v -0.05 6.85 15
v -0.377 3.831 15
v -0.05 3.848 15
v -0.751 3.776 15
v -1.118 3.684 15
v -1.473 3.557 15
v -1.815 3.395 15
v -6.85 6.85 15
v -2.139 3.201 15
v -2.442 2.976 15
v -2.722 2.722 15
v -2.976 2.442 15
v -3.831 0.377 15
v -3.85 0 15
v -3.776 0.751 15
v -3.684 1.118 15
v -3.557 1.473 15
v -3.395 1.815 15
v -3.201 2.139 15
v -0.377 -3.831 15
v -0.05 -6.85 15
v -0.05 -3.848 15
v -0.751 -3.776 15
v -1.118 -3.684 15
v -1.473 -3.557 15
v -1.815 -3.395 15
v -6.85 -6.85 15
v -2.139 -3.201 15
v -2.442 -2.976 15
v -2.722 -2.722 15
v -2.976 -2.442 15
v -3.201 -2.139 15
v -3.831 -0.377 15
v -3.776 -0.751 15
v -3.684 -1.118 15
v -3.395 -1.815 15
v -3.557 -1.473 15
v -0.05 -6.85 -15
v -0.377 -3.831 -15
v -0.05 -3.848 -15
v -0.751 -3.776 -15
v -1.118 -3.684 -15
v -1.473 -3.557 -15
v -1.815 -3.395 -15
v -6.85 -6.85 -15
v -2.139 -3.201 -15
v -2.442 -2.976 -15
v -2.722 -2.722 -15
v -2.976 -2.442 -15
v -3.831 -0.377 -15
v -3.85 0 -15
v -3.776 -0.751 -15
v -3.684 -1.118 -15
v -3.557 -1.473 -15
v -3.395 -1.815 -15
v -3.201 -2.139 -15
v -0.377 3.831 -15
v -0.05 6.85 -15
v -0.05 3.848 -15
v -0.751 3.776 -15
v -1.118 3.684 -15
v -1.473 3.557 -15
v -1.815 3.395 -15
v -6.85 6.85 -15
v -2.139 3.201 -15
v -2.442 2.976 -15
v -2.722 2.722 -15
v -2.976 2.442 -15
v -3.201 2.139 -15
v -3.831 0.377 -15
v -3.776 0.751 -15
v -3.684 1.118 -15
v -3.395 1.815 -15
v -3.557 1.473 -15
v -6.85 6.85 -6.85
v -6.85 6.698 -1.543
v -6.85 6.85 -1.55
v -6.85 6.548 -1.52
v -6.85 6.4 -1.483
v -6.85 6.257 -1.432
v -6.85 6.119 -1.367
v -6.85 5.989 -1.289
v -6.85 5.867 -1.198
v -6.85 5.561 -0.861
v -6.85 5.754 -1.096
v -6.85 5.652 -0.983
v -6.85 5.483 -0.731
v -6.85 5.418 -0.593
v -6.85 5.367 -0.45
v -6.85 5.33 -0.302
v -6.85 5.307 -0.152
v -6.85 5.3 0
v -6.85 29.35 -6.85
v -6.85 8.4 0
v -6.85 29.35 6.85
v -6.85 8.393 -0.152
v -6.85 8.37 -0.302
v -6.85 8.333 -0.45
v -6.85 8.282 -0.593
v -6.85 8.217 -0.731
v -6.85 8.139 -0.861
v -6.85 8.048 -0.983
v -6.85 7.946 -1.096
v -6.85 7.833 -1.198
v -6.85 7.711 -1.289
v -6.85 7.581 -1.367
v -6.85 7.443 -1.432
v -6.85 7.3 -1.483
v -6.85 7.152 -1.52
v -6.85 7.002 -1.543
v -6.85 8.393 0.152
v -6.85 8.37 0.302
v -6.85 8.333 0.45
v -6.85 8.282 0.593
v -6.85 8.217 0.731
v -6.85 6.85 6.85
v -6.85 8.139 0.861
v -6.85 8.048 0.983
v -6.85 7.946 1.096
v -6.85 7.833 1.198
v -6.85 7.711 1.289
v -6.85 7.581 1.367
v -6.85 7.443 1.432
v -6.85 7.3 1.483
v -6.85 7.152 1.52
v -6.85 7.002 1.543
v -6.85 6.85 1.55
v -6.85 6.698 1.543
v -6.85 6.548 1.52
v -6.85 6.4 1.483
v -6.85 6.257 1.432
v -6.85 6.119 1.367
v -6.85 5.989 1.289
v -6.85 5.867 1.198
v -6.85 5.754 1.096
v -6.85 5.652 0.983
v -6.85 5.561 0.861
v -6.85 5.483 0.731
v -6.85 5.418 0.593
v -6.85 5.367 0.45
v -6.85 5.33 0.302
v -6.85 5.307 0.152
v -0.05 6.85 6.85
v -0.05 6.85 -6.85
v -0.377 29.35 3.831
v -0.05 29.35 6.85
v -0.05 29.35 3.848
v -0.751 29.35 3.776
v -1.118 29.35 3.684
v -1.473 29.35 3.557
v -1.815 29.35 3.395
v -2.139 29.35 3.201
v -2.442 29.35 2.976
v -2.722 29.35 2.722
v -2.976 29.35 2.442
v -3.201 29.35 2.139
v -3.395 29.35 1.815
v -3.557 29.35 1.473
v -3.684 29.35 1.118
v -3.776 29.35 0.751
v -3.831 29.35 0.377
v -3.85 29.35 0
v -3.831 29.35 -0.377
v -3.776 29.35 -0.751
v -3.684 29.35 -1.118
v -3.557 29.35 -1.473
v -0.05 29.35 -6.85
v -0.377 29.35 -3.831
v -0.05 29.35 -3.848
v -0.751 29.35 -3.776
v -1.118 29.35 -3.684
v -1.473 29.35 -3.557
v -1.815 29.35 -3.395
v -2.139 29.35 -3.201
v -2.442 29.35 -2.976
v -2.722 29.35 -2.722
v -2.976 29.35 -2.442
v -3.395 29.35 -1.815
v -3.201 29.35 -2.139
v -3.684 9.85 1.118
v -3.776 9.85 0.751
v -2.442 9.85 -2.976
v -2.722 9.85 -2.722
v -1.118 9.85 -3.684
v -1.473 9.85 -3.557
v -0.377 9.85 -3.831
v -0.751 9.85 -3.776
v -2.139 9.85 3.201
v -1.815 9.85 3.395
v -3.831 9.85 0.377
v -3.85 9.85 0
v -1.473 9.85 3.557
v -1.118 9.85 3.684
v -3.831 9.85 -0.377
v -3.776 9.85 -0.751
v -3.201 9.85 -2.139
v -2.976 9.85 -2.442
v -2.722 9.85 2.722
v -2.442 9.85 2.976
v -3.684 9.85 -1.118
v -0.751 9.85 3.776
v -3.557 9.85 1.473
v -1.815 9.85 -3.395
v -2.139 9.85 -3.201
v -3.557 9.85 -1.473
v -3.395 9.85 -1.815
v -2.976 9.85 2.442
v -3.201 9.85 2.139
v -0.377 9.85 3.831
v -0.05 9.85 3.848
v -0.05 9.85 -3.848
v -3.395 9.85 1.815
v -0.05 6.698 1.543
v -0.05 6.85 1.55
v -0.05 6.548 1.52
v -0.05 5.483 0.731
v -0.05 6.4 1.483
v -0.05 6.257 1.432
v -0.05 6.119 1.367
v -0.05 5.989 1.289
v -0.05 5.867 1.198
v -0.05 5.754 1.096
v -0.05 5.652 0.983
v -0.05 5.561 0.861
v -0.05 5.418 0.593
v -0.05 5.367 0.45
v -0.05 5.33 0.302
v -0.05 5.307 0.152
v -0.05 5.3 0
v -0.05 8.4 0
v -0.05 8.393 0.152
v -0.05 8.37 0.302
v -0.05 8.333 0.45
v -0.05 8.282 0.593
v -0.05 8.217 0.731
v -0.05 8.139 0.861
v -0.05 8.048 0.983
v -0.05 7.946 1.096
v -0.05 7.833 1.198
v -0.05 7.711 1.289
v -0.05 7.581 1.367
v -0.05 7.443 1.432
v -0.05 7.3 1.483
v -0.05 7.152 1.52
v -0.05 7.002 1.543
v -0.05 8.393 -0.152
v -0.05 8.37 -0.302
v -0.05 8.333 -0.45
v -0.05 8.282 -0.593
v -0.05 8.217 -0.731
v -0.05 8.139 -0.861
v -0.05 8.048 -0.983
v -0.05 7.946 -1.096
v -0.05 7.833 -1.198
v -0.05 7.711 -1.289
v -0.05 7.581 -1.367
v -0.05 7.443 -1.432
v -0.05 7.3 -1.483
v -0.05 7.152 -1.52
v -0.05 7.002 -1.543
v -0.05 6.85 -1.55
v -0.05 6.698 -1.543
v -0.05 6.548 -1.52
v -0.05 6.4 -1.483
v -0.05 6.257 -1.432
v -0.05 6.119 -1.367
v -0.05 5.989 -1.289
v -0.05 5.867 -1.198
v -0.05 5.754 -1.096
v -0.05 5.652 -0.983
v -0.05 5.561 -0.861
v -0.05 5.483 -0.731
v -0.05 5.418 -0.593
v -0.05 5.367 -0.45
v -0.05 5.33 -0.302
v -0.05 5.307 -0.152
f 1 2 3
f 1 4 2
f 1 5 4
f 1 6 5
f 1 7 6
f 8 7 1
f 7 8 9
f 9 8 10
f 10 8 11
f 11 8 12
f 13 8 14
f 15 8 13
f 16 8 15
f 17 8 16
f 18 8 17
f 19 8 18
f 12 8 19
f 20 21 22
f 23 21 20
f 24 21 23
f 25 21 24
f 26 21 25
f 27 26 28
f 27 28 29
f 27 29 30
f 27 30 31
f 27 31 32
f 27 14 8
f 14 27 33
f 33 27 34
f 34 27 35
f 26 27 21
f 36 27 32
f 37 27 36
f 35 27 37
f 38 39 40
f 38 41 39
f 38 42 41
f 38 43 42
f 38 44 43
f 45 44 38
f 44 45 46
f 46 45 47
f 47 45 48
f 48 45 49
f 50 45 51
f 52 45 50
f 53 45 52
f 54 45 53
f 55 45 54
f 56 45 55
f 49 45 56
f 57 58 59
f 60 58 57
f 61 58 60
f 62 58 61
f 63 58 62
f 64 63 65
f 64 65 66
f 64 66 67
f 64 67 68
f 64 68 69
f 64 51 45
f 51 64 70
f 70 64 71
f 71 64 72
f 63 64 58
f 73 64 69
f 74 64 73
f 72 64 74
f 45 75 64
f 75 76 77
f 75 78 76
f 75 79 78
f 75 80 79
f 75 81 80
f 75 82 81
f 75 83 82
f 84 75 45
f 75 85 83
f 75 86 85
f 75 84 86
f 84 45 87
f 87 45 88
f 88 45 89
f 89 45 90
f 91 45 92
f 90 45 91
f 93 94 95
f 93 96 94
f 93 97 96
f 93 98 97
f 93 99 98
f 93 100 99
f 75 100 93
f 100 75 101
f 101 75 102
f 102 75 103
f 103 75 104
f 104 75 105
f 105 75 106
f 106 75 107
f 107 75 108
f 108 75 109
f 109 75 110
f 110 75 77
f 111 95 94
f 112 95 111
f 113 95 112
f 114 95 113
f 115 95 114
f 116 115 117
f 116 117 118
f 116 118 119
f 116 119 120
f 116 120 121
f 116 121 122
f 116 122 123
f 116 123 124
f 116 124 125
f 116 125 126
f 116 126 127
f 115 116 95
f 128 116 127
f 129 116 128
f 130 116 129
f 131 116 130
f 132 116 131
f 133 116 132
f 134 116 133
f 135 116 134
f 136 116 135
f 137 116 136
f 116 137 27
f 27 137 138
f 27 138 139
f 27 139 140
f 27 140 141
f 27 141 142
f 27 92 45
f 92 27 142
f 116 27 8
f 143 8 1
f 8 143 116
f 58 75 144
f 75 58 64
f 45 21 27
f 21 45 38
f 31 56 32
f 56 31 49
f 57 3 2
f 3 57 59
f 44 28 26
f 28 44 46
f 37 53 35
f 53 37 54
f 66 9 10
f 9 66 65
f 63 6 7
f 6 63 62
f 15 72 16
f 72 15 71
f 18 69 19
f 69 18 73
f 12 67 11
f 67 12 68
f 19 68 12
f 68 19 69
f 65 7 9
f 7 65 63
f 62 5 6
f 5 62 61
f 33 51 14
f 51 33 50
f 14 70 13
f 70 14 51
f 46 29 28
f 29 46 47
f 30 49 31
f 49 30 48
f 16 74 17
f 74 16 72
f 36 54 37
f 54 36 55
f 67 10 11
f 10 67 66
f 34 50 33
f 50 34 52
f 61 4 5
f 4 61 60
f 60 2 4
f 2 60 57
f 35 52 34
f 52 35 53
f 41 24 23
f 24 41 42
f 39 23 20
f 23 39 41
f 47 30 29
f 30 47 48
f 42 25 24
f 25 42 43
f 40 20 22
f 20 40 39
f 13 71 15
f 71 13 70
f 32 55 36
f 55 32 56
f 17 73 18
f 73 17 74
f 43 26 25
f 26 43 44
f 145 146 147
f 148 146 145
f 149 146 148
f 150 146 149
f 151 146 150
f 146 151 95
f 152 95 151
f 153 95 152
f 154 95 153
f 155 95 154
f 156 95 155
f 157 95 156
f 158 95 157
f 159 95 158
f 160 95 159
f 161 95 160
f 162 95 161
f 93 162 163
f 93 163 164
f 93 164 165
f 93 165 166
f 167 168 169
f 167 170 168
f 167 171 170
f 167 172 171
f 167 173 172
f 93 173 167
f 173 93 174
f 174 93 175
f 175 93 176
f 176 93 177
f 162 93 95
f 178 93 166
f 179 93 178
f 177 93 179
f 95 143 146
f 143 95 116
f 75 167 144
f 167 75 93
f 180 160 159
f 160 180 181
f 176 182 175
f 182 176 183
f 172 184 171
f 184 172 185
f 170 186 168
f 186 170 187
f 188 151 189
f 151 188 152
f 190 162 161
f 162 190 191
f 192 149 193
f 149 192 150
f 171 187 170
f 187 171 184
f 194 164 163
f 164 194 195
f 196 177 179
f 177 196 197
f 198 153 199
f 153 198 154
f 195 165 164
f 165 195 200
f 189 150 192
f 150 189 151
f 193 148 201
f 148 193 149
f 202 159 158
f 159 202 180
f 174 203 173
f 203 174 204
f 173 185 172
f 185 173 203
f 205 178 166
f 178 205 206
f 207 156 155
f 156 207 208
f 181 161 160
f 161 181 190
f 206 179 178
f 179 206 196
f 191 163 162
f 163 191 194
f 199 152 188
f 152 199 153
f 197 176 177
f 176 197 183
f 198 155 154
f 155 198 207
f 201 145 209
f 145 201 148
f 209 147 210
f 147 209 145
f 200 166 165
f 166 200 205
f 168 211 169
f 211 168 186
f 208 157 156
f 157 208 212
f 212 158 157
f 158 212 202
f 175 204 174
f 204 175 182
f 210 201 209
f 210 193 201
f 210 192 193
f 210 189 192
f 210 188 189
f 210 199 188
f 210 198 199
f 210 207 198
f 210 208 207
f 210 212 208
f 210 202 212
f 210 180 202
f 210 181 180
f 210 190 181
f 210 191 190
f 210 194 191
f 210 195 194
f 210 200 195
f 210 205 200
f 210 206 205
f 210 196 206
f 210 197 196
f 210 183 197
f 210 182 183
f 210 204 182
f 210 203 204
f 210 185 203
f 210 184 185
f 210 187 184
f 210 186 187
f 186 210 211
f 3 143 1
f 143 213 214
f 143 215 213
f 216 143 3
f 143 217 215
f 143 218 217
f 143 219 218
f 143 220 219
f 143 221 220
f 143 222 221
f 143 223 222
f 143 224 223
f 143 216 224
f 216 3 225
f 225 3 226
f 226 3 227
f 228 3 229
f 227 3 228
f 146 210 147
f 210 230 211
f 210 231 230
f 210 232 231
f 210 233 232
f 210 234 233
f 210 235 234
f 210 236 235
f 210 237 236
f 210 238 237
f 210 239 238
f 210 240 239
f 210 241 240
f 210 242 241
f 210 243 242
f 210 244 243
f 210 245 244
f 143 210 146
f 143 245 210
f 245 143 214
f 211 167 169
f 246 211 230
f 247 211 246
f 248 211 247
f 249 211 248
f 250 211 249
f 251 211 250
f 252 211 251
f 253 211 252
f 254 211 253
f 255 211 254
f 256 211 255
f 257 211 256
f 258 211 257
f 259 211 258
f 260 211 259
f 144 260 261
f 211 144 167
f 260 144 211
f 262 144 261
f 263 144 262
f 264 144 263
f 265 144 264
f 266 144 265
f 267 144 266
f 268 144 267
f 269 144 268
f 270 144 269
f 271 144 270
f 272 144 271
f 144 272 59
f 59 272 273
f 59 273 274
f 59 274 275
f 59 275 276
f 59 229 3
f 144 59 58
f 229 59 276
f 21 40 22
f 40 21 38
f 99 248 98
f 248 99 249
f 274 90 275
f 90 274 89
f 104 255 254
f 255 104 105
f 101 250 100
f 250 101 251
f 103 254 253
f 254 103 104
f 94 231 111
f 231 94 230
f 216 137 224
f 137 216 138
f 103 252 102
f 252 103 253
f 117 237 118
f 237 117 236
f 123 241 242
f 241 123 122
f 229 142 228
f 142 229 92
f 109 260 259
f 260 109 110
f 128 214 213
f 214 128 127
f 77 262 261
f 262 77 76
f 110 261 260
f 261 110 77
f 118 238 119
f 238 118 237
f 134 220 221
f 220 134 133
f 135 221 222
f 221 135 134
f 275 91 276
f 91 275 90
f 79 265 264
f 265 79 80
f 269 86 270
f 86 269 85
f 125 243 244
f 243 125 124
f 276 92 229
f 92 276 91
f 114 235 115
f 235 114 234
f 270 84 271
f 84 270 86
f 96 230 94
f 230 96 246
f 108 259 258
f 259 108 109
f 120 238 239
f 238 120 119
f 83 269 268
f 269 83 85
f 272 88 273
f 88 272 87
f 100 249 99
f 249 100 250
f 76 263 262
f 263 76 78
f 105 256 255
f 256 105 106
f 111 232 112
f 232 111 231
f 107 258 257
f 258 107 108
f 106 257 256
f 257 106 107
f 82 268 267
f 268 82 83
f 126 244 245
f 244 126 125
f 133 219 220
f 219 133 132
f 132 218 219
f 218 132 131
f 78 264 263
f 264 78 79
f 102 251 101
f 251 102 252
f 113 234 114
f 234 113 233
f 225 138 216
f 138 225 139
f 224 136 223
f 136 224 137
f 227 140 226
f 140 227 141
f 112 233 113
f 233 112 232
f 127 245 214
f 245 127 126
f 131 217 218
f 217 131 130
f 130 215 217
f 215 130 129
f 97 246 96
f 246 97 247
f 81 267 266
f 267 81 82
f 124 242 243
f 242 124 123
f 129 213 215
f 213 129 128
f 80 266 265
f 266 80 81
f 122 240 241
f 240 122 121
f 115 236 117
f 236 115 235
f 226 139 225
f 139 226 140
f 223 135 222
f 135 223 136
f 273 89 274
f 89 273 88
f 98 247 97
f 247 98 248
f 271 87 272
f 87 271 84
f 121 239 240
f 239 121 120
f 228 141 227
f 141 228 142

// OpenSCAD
// Requires OpenSCAD 2016.3+

/* [Main] */

// select part
part = "assembly";
//part = "tFitting";
//part = "arrowShaft";
//part = "mountPlate";

/* [Misc] */
plateThickness = 4;	// thickness of mount plate
partThickness = 3;	// thickness of walls (not mount plate) 
iFitAdjust = .4;	// interference fit adjustment for 3D printer
cylHeightExt = .1;	// for overcutting on differences so they render correctly, nothing more, some small positive value
M3D = 3.1;			// M3 screw diameter
// render quality
$fn = 64; // [24:low quality, 48:development, 64:production]

/* [tFitting] */
tFittingCaptureLength = 30;

/* [arrowShaft] */
arrowShaftOD = 7.7;
arrowShaftThickness = 1;
arrowShaftID = arrowShaftOD - 2 * arrowShaftThickness;

/* [mountPlate] */

render_part();

module render_part() {
	if (part == "assembly") {
		assembly();
	} else if (part == "tFitting") {
		tFitting();
	} else if (part == "arrowShaft") {
		arrowShaft();
	} else if (part == "mountPlate") {
		mountPlate();
	} else {
		// invalid value
	}
}

module assembly() {
	//arrowShaft(100);
	tFitting();
}

module tFitting(half) {
	for ([-1, 1]) {
		difference() {
			tFittingWhole();
		}
		difference() {
			tFittingWhole();
		}
	}
}

module tFittingWhole() {
  difference() {
	union() {
		/* horizontal of T */
		difference() {
			cube([arrowShaftOD + 2 * partThickness,
				arrowShaftOD + 2 * partThickness,
				tFittingCaptureLength], center=true);
			cylinder(h=tFittingCaptureLength + cylHeightExt,
				d=arrowShaftOD, center=true);
		}
		/* perpendicular */
		difference() {
		  translate([0,
				tFittingCaptureLength / 4 + ((arrowShaftOD + 2 * partThickness) / 2),
				0])
		   rotate([90, 0, 0])
			difference() {
				cube([arrowShaftOD + 2 * partThickness,
					arrowShaftOD + 2 * partThickness,
					tFittingCaptureLength], center=true);
				cylinder(h=tFittingCaptureLength + cylHeightExt,
					d=arrowShaftOD, center=true);
			}
		 // remove T
		 cylinder(h=tFittingCaptureLength + cylHeightExt,
				d=arrowShaftOD + 2 * partThickness, center=true);
		}
		translate([0, partThickness + arrowShaftOD / 2, 0])
		rotate([0, 90, 0]) {
			cube([arrowShaftOD + 2 * partThickness,
				2 * partThickness,
				arrowShaftOD + 2 * partThickness], center=true);
		}
	}
			translate([(arrowShaftOD + 2 * partThickness) / 2,
				arrowShaftOD + 2 * partThickness,
				0])
			cube([arrowShaftOD + 2 * partThickness + cylHeightExt,
				3.2 * (arrowShaftOD + 2 * partThickness),
				tFittingCaptureLength * 1.1], center=true);
		translate([0, partThickness + arrowShaftOD / 2, 0])
			rotate([0, 90, 0])
				cylinder(h=arrowShaftOD + 2 * partThickness + cylHeightExt,
					d=M3D, center=true);
  }
}

module mountPlate() {

}

module arrowShaft(arrowShaftLength) {
	difference() {
		cylinder(h=arrowShaftLength, d=arrowShaftOD, center=true);
		cylinder(h=arrowShaftLength + cylHeightExt, d=arrowShaftID, center=true);
	}
}

module mountPlate() {

}
